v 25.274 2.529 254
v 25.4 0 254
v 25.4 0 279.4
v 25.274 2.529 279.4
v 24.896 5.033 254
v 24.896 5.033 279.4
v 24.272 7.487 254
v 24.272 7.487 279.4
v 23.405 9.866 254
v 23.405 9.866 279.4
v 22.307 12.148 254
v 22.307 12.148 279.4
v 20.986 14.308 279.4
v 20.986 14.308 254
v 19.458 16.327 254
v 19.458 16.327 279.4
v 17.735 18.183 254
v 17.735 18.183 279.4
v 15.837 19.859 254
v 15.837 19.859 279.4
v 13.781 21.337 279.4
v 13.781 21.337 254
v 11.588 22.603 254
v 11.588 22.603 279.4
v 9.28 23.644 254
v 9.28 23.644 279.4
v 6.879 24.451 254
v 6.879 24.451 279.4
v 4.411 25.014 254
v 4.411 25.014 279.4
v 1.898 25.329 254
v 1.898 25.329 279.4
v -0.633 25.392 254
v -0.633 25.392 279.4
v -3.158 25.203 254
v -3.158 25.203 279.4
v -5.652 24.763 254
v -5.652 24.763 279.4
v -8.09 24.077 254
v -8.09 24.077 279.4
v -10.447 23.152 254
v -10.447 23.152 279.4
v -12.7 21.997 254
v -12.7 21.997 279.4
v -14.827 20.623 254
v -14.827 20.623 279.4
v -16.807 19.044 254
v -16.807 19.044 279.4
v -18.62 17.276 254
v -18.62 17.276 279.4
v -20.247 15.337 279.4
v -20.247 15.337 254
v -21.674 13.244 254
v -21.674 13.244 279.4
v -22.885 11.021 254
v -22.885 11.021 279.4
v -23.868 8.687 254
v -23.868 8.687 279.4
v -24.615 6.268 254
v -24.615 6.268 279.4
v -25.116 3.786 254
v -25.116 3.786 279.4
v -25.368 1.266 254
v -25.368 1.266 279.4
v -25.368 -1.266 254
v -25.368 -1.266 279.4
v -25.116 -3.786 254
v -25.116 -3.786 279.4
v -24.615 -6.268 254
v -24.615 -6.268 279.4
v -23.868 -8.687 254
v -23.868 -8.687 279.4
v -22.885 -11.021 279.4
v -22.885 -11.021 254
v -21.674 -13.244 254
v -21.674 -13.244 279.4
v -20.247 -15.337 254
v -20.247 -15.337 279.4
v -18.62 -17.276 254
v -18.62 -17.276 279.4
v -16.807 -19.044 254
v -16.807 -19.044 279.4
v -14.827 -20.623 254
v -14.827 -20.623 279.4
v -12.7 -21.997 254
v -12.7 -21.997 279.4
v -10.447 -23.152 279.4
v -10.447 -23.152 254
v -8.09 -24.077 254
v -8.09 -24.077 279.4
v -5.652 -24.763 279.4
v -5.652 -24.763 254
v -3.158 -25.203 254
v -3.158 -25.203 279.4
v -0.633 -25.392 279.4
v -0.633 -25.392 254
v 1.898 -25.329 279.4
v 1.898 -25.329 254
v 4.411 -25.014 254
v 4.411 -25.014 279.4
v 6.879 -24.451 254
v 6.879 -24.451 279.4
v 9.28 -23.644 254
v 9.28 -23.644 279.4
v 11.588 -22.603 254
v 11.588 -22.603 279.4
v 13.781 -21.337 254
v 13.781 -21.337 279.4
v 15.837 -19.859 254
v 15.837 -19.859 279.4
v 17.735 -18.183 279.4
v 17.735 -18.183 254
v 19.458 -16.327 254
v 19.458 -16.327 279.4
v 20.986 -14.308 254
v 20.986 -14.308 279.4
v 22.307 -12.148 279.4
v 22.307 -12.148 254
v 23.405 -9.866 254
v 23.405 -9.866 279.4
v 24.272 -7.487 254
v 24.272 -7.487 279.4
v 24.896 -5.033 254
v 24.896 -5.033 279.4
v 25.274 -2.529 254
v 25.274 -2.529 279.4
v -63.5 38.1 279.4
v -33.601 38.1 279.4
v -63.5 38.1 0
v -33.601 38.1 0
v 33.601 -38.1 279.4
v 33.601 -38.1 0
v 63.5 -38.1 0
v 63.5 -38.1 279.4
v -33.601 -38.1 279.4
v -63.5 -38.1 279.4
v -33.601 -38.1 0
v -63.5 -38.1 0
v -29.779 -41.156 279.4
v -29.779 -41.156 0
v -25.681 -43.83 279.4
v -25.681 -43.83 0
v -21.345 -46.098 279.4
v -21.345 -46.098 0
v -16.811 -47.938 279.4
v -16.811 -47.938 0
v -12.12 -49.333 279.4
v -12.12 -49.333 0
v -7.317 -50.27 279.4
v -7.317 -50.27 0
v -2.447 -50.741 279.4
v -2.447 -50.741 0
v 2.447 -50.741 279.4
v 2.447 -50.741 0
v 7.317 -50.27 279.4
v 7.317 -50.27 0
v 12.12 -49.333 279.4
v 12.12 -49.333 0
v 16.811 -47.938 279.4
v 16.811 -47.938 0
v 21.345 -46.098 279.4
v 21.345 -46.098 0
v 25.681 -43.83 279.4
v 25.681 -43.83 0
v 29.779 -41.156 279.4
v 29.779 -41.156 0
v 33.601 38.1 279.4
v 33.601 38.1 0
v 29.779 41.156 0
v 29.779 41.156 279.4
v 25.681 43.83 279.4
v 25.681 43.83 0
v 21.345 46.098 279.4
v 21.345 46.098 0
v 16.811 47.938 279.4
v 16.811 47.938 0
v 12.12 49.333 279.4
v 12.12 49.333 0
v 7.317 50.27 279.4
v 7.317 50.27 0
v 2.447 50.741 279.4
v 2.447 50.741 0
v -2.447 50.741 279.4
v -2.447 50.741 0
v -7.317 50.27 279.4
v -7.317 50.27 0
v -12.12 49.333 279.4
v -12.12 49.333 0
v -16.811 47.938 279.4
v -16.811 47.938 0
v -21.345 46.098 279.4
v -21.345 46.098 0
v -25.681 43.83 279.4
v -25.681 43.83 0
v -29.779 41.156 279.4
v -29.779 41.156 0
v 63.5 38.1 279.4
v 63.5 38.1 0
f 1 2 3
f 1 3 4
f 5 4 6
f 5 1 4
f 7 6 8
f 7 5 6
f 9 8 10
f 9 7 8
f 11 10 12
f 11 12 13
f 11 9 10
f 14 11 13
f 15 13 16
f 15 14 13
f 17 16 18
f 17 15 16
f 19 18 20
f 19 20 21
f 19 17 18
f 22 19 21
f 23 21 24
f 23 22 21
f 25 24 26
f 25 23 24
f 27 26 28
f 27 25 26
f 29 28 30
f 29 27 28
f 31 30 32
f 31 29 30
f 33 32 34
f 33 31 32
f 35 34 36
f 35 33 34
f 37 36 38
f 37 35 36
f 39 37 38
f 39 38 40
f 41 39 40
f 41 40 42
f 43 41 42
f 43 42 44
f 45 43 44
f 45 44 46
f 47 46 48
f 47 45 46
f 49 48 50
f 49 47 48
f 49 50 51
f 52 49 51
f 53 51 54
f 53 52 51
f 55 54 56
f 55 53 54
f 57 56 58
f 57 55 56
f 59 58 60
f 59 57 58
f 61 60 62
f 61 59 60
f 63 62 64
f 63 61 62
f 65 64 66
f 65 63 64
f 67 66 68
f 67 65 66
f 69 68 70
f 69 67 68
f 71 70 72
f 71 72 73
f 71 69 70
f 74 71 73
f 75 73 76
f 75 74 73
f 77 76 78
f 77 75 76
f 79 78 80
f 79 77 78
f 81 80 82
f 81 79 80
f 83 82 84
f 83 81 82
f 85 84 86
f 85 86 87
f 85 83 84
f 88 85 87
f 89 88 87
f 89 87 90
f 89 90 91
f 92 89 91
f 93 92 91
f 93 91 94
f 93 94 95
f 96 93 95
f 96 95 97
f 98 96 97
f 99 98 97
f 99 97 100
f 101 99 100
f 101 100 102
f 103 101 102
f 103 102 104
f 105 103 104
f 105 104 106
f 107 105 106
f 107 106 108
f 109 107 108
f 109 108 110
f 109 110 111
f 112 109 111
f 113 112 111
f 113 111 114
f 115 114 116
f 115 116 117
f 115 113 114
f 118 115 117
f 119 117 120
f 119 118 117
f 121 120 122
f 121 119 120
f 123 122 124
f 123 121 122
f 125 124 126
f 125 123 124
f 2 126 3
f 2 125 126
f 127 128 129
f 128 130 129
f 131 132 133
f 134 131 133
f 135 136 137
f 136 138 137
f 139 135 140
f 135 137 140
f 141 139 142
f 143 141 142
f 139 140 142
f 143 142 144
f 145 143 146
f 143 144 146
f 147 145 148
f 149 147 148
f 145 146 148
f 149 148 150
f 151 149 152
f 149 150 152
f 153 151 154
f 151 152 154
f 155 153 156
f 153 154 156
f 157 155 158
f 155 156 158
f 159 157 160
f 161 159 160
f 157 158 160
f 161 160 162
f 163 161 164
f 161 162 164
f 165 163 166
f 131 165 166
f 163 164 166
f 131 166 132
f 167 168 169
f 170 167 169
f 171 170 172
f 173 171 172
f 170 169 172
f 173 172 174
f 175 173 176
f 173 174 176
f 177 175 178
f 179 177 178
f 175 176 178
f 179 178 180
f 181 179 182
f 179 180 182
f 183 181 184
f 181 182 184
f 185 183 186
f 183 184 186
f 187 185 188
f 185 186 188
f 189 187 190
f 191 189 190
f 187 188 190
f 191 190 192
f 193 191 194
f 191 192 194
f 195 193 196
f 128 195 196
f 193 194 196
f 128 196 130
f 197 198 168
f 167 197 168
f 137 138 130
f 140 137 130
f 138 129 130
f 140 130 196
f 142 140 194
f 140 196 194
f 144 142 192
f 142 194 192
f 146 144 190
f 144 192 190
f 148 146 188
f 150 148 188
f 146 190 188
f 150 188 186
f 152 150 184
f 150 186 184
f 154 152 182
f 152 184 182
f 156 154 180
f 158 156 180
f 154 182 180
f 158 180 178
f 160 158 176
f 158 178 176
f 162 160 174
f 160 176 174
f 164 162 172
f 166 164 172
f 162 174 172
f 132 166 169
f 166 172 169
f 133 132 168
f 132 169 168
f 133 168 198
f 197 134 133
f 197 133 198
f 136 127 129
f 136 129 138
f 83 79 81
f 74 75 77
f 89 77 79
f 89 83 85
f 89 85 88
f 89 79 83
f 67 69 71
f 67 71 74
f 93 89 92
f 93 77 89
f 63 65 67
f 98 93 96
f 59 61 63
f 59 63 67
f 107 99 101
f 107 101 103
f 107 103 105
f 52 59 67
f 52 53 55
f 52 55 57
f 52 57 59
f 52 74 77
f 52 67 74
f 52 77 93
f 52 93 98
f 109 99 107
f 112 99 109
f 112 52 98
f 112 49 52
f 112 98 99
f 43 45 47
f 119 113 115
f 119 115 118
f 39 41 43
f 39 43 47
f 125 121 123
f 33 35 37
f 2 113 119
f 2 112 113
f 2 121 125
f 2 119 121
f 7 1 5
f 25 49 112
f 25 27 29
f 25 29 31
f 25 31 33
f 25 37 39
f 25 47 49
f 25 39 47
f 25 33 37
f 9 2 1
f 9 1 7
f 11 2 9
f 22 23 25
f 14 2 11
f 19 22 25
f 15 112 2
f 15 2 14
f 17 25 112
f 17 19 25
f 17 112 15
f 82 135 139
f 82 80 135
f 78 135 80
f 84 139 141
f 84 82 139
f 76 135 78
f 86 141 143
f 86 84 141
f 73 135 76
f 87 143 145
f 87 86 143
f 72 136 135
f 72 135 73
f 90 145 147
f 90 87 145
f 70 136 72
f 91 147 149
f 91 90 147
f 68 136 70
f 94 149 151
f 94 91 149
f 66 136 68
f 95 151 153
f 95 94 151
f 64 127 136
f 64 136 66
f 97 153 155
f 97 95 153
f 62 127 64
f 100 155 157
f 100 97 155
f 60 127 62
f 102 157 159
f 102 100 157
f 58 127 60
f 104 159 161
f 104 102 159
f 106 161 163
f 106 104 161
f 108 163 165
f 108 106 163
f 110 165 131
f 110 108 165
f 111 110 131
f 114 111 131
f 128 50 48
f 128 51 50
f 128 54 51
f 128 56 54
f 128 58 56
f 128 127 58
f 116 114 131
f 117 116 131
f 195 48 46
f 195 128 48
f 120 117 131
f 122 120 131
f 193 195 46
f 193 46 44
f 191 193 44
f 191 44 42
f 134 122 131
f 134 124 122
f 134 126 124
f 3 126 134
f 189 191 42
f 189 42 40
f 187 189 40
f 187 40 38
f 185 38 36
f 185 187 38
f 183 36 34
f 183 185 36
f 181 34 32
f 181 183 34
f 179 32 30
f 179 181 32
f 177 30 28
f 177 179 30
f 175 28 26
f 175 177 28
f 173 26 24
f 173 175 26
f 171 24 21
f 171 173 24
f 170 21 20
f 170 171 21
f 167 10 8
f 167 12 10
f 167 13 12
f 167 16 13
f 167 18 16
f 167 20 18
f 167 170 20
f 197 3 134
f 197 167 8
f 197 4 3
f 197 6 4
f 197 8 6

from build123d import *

# Parameters (mm, degrees)
F1_DEPTH = 254
F2_R     = 25.4
F3_DEPTH = 25.4


with BuildPart() as f1:
    # F0 (on Top) → F1 (new body)
    with BuildSketch(Plane.XY):
        with BuildLine():
            Line((-63.5, -38.1), (-33.601042, -38.1))
            ThreePointArc((-33.601042, -38.1), (0, -50.8), (33.601042, -38.1))
            Line((33.601042, -38.1), (63.5, -38.1))
            Line((63.5, -38.1), (63.5, 38.1))
            Line((63.5, 38.1), (33.601042, 38.1))
            ThreePointArc((33.601042, 38.1), (0, 50.8), (-33.601042, 38.1))
            Line((-33.601042, 38.1), (-63.5, 38.1))
            Line((-63.5, 38.1), (-63.5, -38.1))
        make_face()
    extrude(amount=F1_DEPTH)

    # F2 (on face) → F3 (join)
    with BuildSketch(Plane.XY.offset(254)):
        with BuildLine():
            ThreePointArc((33.601042, 38.1), (0, 50.8), (-33.601042, 38.1))
            Line((-33.601042, 38.1), (-63.5, 38.1))
            Line((-63.5, 38.1), (-63.5, -38.1))
            Line((-63.5, -38.1), (-33.601042, -38.1))
            ThreePointArc((-33.601042, -38.1), (0, -50.8), (33.601042, -38.1))
            Line((33.601042, -38.1), (63.5, -38.1))
            Line((63.5, -38.1), (63.5, 38.1))
            Line((63.5, 38.1), (33.601042, 38.1))
        make_face()
        Circle(F2_R, mode=Mode.SUBTRACT)
    extrude(amount=F3_DEPTH)


solid = f1.part
